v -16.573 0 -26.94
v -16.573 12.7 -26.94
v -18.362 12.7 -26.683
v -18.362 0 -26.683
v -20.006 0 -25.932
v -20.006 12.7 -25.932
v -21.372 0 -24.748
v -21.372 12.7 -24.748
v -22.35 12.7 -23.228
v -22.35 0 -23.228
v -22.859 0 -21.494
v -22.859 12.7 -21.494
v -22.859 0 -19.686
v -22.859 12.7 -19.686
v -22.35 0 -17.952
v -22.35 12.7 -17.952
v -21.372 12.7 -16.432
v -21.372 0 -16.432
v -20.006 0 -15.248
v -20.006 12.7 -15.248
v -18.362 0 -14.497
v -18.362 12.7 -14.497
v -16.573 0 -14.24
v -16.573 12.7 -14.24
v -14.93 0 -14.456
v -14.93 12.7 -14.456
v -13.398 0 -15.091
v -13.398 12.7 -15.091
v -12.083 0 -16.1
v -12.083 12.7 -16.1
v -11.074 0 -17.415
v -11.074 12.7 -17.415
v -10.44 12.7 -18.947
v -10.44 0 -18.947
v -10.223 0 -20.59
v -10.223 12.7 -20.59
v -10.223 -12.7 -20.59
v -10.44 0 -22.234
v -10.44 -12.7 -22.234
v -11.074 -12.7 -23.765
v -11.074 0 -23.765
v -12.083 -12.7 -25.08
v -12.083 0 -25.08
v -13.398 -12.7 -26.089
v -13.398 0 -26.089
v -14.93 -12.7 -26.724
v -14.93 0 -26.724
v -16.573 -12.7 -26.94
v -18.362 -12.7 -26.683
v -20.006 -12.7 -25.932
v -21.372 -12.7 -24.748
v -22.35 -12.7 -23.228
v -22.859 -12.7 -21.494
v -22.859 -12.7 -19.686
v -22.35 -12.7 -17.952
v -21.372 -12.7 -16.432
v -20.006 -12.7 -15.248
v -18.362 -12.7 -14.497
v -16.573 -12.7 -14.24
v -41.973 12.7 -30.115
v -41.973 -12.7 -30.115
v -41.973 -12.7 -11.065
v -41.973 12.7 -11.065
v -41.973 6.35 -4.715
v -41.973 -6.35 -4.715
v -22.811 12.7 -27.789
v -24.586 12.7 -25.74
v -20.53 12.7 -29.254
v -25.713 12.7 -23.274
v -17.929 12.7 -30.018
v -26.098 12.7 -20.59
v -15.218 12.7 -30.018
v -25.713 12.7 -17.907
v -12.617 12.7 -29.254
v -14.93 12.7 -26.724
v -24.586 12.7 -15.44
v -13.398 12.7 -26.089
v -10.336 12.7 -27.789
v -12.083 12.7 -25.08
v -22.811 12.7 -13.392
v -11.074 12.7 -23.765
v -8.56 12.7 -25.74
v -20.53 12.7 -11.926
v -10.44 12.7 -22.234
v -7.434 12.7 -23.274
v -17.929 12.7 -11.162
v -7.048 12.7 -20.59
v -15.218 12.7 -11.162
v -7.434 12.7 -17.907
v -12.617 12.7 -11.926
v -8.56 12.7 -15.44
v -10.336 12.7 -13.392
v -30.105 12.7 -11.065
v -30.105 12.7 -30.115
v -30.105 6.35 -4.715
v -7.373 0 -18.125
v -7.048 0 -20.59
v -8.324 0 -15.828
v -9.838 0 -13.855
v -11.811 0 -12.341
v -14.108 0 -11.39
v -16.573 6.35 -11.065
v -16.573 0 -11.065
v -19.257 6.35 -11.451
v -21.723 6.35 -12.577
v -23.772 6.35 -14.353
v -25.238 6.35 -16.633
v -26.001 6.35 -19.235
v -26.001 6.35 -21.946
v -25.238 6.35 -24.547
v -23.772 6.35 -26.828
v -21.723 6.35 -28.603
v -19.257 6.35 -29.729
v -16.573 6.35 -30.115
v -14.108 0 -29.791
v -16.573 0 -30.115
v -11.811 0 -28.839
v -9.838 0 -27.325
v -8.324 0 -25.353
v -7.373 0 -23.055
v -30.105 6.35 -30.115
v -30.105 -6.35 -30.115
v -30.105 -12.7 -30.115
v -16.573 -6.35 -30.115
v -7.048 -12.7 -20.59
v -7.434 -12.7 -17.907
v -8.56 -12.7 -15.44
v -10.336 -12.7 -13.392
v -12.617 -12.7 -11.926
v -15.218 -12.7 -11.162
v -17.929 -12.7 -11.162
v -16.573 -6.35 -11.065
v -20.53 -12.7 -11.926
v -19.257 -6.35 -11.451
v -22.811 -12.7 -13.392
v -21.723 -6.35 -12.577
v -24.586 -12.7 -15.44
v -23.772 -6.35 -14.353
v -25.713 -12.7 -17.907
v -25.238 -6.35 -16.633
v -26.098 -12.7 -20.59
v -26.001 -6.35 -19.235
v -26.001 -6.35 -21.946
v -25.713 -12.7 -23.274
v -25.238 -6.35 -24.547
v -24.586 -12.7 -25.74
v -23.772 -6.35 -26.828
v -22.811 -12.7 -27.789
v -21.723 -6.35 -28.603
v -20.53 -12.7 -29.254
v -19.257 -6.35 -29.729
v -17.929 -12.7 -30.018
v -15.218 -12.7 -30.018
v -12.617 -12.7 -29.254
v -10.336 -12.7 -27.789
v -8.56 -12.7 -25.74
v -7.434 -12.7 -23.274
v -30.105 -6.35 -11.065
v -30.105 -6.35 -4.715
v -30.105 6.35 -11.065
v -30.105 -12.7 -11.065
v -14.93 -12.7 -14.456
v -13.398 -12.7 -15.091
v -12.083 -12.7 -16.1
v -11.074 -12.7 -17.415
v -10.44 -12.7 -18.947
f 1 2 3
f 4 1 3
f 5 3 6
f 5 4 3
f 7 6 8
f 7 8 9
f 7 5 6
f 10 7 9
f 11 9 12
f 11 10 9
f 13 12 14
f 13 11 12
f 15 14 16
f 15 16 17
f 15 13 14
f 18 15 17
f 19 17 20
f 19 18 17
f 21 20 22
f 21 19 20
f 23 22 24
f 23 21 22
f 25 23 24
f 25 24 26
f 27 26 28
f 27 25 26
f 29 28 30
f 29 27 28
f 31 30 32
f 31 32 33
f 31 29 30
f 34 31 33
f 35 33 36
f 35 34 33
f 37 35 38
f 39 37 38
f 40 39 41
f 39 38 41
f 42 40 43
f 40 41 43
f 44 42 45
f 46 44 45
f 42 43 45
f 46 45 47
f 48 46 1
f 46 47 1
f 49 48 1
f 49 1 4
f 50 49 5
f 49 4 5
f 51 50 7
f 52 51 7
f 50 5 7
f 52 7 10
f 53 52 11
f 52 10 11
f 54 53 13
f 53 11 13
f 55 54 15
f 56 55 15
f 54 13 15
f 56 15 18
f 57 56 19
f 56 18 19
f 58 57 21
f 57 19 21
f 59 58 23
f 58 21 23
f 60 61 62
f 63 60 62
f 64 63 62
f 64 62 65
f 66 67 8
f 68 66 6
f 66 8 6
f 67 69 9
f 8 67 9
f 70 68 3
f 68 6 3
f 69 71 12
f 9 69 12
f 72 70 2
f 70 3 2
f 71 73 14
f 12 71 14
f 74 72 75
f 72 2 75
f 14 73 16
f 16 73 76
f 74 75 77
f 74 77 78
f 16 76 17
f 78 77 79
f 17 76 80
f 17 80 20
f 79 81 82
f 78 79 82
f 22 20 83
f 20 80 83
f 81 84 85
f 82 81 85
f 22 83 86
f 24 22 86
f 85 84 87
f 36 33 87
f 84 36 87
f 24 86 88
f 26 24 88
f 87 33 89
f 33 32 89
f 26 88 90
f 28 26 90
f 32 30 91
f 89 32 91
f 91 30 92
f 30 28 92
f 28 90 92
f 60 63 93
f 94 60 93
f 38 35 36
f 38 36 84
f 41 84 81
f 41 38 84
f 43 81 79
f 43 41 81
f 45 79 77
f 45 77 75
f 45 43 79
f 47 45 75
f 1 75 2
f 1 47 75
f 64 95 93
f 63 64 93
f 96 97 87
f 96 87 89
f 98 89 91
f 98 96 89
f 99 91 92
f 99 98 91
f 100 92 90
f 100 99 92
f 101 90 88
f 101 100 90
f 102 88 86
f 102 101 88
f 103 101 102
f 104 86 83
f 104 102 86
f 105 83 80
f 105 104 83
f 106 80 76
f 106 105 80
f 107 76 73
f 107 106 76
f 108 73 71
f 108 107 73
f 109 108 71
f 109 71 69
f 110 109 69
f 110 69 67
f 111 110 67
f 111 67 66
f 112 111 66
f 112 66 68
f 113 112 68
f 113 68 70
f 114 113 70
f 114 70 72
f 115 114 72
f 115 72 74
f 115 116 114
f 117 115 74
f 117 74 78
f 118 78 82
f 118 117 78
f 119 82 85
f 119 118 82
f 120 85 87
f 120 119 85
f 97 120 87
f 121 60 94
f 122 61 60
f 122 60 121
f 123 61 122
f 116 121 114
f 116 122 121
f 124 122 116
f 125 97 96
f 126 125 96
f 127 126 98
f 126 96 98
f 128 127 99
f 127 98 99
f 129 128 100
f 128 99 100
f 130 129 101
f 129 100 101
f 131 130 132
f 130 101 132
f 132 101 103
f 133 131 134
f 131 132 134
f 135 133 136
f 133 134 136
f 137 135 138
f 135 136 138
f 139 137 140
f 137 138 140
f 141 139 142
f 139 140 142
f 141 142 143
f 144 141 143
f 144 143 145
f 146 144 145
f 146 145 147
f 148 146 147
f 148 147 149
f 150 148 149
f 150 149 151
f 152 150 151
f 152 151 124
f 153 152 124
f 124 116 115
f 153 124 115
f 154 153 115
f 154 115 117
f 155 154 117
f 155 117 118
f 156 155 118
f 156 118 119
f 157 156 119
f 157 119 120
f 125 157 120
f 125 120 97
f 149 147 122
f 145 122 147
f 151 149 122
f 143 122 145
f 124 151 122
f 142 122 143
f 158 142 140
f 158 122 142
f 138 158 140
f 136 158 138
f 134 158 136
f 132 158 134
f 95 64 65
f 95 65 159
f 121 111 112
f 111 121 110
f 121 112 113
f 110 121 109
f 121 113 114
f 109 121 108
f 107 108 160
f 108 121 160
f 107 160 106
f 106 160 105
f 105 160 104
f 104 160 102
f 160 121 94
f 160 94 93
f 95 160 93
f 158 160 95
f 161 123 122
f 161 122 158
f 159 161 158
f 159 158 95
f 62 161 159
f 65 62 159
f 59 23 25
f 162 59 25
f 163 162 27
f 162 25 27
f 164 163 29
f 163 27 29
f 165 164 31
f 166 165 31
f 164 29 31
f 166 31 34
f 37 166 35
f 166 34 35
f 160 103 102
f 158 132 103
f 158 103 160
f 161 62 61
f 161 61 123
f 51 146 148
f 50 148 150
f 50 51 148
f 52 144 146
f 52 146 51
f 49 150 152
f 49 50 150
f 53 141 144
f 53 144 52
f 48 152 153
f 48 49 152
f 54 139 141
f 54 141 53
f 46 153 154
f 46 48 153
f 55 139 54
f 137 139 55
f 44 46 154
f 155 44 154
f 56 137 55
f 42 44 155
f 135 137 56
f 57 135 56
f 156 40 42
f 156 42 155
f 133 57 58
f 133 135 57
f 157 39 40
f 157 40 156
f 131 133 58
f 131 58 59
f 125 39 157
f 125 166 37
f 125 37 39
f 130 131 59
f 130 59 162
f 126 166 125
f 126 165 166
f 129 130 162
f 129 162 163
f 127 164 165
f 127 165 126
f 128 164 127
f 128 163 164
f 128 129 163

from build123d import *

# Parameters (mm, degrees)
F0_W          = 11.8681662488
F0_H          = 19.05
F1_DEPTH      = 12.7
F1_DEPTH_BACK = 12.7
F2_DEPTH      = 6.35
F2_DEPTH_BACK = 6.35
F3_DEPTH      = 12.7
F3_DEPTH_BACK = 12.7
F0_H_2        = 6.35
F4_DEPTH      = 12.7
F4_DEPTH_BACK = 12.7
F6_DEPTH      = 12.7


with BuildPart() as f1:
    # F0 (on Front) → F1 (new body, two sides)
    with BuildSketch(Plane.XZ) as f1_sk:
        with Locations((-36.0392803956, -20.5900701019)):
            Rectangle(F0_W, F0_H)
    extrude(amount=F1_DEPTH)
    extrude(f1_sk.sketch, amount=-F1_DEPTH_BACK)

    # F0 (on Front) → F2 (join, two sides)
    with BuildSketch(Plane.XZ) as f2_sk:
        with BuildLine():
            Line((-30.1051972712, -11.0650701019), (-30.1051972712, -30.1150701019))
            Line((-30.1051972712, -30.1150701019), (-16.57336352, -30.1150701019))
            ThreePointArc((-16.57336352, -30.1150701019), (-26.09836352, -20.5900701019), (-16.57336352, -11.0650701019))
            Line((-16.57336352, -11.0650701019), (-30.1051972712, -11.0650701019))
        make_face()
    extrude(amount=F2_DEPTH)
    extrude(f2_sk.sketch, amount=-F2_DEPTH_BACK)

    # F0 (on Front) → F3 (join, two sides)
    with BuildSketch(Plane.XZ) as f3_sk:
        with BuildLine():
            Line((-16.57336352, -26.9400701019), (-16.57336352, -30.1150701019))
            ThreePointArc((-16.57336352, -30.1150701019), (-9.8381714292, -27.3252621927), (-7.04836352, -20.5900701019))
            ThreePointArc((-7.04836352, -20.5900701019), (-9.8381714292, -13.8548780111), (-16.57336352, -11.0650701019))
            Line((-16.57336352, -11.0650701019), (-16.57336352, -14.2400701019))
            ThreePointArc((-16.57336352, -14.2400701019), (-12.0832354595, -16.0999420414), (-10.22336352, -20.5900701019))
            ThreePointArc((-10.22336352, -20.5900701019), (-12.0832354595, -25.0801981625), (-16.57336352, -26.9400701019))
        make_face()
        with BuildLine():
            ThreePointArc((-16.57336352, -11.0650701019), (-26.09836352, -20.5900701019), (-16.57336352, -30.1150701019))
            Line((-16.57336352, -30.1150701019), (-16.57336352, -26.9400701019))
            ThreePointArc((-16.57336352, -26.9400701019), (-22.92336352, -20.5900701019), (-16.57336352, -14.2400701019))
            Line((-16.57336352, -14.2400701019), (-16.57336352, -11.0650701019))
        make_face()
    extrude(amount=F3_DEPTH)
    extrude(f3_sk.sketch, amount=-F3_DEPTH_BACK)

    # F0 (on Front) → F4 (join, two sides)
    with BuildSketch(Plane.XZ) as f4_sk:
        with Locations((-36.0392803956, -7.8900701019)):
            Rectangle(F0_W, F0_H_2)
    extrude(amount=F4_DEPTH)
    extrude(f4_sk.sketch, amount=-F4_DEPTH_BACK)

    # F5 (on face) → F6 (cut)
    with BuildSketch(Plane.YZ.offset(-30.1051972712)):
        Polygon((12.7, -4.7150701019), (6.35, -4.7150701019), (12.7, -11.0650701019), align=None)
        Polygon((-12.7, -11.0650701019), (-6.35, -4.7150701019), (-12.7, -4.7150701019), align=None)
    extrude(amount=-F6_DEPTH, mode=Mode.SUBTRACT)


solid = f1.part
